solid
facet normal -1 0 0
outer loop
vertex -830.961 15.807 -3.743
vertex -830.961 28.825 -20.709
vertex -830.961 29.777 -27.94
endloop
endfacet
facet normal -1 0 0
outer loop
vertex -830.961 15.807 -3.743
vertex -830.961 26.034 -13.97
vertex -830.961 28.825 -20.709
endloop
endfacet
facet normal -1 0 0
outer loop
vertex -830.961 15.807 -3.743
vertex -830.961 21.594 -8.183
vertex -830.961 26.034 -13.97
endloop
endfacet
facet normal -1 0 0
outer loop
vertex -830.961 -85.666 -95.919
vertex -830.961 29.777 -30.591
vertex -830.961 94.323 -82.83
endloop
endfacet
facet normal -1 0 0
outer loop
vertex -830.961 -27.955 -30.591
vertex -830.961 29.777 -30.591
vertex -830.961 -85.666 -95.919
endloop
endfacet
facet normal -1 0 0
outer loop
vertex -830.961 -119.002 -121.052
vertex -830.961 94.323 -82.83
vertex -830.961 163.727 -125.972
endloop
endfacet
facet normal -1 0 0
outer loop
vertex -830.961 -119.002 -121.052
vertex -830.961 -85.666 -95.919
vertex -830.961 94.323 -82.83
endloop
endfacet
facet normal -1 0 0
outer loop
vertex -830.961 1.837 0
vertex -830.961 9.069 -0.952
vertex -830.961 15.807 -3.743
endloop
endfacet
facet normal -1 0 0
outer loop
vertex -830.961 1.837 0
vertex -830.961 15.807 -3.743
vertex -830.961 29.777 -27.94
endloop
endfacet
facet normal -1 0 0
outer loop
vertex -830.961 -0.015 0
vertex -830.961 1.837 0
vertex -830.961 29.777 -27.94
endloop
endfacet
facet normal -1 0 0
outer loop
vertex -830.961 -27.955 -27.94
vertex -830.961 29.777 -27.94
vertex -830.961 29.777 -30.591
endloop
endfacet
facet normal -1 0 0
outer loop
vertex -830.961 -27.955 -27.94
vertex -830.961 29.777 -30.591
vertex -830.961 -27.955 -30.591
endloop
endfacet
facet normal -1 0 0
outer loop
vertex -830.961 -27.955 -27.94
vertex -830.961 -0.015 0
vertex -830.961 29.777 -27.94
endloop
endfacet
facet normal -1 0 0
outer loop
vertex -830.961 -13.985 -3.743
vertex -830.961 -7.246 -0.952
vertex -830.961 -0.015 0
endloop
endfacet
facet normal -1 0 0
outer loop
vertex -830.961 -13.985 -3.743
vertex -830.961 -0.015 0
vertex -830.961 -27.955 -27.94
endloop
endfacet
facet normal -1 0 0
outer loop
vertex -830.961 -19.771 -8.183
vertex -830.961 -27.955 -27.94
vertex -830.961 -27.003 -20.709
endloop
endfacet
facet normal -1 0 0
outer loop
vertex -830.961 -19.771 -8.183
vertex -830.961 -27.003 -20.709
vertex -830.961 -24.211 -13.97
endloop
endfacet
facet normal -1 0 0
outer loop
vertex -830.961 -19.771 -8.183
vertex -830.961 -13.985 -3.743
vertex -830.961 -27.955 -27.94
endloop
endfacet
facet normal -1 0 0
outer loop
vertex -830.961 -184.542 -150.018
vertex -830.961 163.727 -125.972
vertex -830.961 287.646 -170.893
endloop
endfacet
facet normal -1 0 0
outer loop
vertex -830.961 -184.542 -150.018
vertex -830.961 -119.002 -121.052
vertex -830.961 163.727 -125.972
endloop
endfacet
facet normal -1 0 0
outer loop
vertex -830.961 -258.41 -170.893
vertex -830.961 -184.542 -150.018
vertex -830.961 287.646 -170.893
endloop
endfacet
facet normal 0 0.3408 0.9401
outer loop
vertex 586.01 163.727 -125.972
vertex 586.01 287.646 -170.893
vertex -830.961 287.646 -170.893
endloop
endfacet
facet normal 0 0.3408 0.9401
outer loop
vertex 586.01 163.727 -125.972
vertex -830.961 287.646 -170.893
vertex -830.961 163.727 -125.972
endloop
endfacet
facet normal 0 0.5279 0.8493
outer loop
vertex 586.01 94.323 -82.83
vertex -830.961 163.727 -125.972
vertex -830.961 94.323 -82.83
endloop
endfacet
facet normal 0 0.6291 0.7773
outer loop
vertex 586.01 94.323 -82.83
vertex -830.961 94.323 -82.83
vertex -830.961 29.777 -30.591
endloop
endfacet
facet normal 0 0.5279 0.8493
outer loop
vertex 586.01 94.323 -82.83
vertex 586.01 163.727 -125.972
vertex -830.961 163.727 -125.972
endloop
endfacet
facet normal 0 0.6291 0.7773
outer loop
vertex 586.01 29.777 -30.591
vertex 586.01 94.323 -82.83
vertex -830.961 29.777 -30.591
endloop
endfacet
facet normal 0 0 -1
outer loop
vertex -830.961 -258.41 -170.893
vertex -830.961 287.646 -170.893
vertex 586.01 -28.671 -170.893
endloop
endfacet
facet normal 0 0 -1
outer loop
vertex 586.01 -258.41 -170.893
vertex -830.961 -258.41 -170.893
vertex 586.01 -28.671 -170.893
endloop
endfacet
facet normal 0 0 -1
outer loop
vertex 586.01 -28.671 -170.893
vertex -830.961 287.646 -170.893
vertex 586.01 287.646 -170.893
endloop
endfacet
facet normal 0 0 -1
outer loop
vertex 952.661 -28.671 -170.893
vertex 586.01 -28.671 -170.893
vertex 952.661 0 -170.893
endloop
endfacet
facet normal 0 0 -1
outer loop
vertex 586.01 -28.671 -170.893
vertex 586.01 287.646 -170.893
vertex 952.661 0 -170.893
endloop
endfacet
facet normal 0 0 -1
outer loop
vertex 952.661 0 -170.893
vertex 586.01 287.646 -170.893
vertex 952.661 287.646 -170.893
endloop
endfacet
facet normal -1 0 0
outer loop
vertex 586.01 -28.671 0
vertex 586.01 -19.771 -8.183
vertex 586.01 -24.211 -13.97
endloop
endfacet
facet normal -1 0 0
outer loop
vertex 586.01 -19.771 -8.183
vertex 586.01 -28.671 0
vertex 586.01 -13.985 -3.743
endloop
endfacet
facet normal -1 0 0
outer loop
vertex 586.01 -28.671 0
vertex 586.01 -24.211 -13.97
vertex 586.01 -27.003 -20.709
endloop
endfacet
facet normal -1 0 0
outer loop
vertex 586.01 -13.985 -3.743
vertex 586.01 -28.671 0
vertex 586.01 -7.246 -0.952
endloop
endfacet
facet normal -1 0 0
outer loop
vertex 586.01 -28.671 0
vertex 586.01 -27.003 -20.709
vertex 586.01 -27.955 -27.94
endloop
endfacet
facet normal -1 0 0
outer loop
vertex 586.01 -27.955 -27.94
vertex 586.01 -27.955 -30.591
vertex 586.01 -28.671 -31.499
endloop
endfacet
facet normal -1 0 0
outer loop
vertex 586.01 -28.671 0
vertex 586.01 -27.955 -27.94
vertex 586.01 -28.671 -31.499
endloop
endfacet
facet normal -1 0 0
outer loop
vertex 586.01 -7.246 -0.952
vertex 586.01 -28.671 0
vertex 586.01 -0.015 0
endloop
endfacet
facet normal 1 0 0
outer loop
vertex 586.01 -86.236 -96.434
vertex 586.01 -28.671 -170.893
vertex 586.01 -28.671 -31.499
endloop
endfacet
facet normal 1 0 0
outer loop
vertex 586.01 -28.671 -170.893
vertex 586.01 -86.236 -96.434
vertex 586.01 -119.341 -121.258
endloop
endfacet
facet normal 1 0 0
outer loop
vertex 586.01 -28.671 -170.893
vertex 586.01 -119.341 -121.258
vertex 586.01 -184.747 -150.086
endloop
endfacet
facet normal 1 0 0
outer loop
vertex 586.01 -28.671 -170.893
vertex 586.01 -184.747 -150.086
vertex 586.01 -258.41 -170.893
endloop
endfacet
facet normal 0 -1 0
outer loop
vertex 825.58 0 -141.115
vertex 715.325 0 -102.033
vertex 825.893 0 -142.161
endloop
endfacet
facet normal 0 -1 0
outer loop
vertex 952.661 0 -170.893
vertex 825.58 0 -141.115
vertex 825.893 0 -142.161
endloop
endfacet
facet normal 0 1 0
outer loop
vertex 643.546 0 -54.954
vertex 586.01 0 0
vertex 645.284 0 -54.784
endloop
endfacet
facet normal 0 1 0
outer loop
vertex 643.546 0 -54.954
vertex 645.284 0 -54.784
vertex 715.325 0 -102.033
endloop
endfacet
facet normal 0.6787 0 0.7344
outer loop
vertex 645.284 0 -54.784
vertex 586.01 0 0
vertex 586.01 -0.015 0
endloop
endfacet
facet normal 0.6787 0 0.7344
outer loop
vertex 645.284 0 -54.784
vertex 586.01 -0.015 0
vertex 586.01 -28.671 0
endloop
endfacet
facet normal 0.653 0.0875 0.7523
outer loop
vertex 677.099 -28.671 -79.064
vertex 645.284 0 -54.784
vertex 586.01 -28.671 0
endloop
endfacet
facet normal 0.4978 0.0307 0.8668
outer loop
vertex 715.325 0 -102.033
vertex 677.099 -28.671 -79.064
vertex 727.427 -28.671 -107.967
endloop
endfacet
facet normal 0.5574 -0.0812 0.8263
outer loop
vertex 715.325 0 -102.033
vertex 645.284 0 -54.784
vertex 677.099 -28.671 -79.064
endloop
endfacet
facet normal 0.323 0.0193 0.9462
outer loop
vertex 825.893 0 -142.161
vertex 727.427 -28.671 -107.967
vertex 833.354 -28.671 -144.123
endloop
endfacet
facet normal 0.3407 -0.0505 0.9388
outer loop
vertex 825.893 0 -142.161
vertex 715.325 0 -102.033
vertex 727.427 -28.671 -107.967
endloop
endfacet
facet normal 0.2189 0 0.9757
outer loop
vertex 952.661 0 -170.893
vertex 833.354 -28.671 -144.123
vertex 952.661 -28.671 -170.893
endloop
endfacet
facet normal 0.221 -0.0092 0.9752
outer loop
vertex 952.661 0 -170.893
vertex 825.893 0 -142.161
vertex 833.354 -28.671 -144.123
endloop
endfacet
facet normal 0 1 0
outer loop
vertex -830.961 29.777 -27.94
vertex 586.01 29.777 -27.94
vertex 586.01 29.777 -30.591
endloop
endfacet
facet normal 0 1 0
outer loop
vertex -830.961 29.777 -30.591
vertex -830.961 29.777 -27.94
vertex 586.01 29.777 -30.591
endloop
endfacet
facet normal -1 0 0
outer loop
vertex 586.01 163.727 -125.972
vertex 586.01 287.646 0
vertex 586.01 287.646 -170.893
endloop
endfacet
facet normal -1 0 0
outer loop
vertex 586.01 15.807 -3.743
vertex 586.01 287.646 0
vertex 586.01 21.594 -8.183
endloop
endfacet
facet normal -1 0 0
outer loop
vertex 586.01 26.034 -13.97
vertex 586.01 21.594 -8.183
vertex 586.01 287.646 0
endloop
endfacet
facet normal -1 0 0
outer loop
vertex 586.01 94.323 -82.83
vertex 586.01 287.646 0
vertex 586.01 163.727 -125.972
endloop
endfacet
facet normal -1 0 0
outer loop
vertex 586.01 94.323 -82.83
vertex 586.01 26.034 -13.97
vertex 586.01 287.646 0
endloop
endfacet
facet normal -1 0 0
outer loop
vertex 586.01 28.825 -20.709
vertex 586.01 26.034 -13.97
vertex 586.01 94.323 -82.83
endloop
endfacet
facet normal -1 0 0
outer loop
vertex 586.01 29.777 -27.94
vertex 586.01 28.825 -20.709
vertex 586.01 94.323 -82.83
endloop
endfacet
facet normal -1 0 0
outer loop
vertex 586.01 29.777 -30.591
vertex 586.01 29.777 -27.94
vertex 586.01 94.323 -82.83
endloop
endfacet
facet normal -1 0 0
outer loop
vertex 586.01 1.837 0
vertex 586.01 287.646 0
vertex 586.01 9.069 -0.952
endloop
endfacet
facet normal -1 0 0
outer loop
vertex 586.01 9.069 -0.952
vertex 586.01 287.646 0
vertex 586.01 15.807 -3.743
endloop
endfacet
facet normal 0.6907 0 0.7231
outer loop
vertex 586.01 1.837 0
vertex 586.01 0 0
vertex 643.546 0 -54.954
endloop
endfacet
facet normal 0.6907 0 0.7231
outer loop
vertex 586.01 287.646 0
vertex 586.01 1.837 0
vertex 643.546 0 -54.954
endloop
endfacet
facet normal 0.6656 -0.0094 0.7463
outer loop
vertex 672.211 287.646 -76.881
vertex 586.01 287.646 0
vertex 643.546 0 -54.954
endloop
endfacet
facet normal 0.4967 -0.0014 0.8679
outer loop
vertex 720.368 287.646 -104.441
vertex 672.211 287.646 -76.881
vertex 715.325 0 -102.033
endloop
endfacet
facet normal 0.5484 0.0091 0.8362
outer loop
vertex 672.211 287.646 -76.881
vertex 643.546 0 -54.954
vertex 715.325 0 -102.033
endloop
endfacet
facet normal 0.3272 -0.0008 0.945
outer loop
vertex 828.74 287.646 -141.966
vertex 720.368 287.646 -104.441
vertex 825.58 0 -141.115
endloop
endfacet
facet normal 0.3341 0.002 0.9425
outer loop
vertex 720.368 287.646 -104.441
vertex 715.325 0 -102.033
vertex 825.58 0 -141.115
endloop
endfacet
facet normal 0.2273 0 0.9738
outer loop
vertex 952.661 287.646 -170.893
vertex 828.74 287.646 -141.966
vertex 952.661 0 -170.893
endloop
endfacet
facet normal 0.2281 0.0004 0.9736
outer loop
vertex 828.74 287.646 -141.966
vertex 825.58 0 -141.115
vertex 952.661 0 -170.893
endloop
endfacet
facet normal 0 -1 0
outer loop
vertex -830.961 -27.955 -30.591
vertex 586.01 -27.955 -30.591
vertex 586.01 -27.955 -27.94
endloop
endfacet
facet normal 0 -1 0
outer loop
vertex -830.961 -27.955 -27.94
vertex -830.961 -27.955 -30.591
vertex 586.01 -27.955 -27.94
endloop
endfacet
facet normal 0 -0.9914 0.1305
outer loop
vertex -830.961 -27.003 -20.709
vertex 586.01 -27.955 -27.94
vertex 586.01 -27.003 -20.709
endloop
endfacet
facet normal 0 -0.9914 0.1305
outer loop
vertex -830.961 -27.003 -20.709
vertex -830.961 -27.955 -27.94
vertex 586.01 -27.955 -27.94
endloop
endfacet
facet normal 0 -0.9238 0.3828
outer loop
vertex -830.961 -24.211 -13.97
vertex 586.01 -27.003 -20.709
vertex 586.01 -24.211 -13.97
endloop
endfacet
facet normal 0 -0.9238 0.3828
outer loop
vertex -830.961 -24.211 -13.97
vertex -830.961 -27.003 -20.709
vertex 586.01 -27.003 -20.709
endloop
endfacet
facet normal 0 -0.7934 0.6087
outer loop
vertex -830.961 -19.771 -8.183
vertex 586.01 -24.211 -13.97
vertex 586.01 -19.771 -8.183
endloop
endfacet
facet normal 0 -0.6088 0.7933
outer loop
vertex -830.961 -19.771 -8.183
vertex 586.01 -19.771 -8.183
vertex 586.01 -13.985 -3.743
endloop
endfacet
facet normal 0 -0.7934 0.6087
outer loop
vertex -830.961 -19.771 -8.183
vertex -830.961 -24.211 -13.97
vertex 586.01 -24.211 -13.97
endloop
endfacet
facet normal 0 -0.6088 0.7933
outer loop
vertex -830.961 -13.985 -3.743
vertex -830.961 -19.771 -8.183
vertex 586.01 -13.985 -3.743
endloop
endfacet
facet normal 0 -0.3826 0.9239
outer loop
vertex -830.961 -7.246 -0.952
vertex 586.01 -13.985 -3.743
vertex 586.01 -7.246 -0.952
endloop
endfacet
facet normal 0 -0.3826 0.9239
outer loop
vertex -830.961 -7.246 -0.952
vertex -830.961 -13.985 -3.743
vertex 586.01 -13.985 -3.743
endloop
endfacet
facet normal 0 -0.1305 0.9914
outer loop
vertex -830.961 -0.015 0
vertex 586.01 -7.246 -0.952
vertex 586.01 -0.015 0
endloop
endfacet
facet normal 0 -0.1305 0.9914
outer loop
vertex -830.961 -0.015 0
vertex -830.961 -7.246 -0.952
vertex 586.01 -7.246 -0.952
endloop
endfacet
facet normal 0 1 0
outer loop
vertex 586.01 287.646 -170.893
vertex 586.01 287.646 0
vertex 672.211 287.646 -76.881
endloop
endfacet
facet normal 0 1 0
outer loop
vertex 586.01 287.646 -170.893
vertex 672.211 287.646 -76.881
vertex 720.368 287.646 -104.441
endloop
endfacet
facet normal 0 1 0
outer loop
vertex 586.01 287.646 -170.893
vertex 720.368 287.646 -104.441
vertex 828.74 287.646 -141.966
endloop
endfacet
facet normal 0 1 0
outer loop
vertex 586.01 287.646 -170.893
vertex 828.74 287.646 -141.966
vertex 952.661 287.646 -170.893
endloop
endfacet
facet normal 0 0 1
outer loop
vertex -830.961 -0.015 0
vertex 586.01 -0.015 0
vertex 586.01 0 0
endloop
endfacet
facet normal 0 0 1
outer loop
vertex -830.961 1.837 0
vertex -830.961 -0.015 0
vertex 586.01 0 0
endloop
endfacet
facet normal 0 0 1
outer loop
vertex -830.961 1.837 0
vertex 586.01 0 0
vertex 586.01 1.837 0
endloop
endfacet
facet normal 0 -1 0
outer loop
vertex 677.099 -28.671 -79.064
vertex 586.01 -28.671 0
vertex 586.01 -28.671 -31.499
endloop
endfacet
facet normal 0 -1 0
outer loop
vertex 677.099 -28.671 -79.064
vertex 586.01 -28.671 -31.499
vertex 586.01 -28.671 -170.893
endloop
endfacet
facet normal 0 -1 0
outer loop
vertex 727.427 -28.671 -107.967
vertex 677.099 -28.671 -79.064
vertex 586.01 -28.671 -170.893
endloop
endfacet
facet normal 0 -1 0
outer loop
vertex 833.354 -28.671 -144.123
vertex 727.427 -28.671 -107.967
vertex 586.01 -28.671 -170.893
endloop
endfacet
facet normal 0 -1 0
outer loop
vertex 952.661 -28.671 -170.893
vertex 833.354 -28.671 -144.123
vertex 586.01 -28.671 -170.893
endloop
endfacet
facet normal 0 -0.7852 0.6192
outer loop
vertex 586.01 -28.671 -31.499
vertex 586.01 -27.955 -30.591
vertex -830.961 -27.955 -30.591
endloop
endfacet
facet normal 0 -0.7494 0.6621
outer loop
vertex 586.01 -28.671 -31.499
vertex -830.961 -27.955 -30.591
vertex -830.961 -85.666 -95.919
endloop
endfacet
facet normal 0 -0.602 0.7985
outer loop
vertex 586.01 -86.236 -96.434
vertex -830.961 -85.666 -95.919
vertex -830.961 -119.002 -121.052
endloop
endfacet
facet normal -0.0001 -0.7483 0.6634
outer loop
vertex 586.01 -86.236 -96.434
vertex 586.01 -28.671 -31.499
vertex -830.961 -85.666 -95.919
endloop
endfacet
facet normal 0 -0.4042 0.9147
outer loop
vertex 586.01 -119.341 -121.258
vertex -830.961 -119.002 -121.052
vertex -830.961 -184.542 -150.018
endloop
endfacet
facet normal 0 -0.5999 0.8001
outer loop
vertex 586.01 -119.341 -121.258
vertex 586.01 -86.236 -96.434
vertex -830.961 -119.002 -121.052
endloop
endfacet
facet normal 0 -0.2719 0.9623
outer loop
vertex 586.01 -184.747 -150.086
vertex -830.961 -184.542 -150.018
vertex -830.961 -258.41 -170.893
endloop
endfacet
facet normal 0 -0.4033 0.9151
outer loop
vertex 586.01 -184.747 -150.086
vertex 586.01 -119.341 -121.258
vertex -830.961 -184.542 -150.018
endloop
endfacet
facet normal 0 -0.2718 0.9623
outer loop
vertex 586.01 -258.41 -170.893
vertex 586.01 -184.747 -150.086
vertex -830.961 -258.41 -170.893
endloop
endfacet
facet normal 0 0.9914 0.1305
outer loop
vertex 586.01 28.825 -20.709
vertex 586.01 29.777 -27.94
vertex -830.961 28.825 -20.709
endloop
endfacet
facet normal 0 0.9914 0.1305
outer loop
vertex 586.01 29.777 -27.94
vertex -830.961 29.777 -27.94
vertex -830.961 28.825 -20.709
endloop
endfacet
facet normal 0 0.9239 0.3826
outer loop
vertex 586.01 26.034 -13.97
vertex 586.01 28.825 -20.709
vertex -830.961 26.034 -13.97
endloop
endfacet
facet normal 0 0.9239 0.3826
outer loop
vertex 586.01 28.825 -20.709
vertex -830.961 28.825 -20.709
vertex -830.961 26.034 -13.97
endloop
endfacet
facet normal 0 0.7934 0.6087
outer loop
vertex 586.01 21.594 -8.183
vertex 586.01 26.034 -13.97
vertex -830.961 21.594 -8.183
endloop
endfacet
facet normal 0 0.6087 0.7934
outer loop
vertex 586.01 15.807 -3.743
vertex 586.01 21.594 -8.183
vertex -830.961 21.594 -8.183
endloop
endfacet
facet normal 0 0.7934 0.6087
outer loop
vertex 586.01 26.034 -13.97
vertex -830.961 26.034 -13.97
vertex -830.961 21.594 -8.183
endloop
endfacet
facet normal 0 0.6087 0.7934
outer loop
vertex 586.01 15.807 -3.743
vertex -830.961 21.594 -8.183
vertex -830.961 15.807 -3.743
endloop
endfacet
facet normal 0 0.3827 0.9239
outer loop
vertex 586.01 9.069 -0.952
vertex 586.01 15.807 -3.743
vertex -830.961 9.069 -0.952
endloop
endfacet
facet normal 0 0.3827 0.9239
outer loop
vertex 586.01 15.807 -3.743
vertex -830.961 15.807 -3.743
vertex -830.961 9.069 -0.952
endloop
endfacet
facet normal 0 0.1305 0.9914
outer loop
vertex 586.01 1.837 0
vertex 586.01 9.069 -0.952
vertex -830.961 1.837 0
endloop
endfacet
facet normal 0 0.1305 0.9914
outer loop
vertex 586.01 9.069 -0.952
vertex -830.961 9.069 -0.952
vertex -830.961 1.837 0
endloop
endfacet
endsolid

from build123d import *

# Parameters (mm, degrees)
F1_DEPTH = 287.6463532448
F3_DEPTH = 1416.9713258743
F4_R     = 27.94
F6_DEPTH = 28.6714229733


with BuildPart() as f1:
    # F0 (on Front) → F1 (new body)
    with BuildSketch(Plane.XZ):
        with BuildLine():
            Line((586.0098600388, -170.8933115005), (952.6613950729, -170.8933115005))
            add(Edge.make_bspline(
                [(586.0098600388, 0), (620.4589978435, -35.1400250661), (699.6360054649, -115.9049409737), (861.3228837136, -151.043304619), (952.6613950729, -170.8933115005)],
                knots=[0, 0, 0, 0, 0.4350901742, 1, 1, 1, 1], degree=3))
            Line((586.0098600388, 0), (586.0098600388, -170.8933115005))
        make_face()
    extrude(amount=-F1_DEPTH)

    # F2 (on face) → F3 (join)
    with BuildSketch(Plane(origin=(586.0098600388, 0, 0), x_dir=(0, -1, 0), z_dir=(-1, 0, 0))):
        with BuildLine():
            Line((-287.6463532448, -170.8933115005), (0, -170.8933115005))
            Line((0, -170.8933115005), (258.4099173546, -170.8933115005))
            add(Edge.make_bspline(
                [(27.9546976089, -30.5913537741), (53.6556852067, -63.1414344295), (107.897795811, -131.8386094304), (206.5179496748, -157.4284439302), (258.4099173546, -170.8933115005)],
                knots=[0, 0, 0, 0, 0.4738197545, 1, 1, 1, 1], degree=3))
            Line((27.9546976089, -30.5913537741), (27.9546976089, 0))
            Line((27.9546976089, 0), (-29.7771990299, 0))
            Line((-29.7771990299, 0), (-29.7771990299, -30.5913537741))
            add(Edge.make_bspline(
                [(-287.6463532448, -170.8933115005), (-239.9758235568, -156.4023167375), (-144.5368623868, -127.3905600389), (-68.0565740127, -62.8798215261), (-29.7771990299, -30.5913537741)],
                knots=[0, 0, 0, 0, 0.499487118, 1, 1, 1, 1], degree=3))
        make_face()
    extrude(amount=F3_DEPTH)

    # F4
    f4_edges = [f1.edges().sort_by_distance(p)[0] for p in [
        (-122.475803, -27.954698, 0),
        (-122.475803, 29.777199, 0),
    ]]
    fillet(f4_edges, radius=F4_R)

    # F5 (on face) → F6 (join)
    with BuildSketch(Plane.XZ):
        with BuildLine():
            Line((586.0098600388, -170.8933115005), (952.6613950729, -170.8933115005))
            add(Edge.make_bspline(
                [(586.0098600388, 0), (624.4093625475, -37.2079323351), (709.3130934728, -121.0024943877), (866.4472155814, -152.8188445982), (952.6613950729, -170.8933115005)],
                knots=[0, 0, 0, 0, 0.449468387, 1, 1, 1, 1], degree=3))
            Line((586.0098600388, 0), (586.0098600388, -170.8933115005))
        make_face()
    extrude(amount=F6_DEPTH)


solid = f1.part
